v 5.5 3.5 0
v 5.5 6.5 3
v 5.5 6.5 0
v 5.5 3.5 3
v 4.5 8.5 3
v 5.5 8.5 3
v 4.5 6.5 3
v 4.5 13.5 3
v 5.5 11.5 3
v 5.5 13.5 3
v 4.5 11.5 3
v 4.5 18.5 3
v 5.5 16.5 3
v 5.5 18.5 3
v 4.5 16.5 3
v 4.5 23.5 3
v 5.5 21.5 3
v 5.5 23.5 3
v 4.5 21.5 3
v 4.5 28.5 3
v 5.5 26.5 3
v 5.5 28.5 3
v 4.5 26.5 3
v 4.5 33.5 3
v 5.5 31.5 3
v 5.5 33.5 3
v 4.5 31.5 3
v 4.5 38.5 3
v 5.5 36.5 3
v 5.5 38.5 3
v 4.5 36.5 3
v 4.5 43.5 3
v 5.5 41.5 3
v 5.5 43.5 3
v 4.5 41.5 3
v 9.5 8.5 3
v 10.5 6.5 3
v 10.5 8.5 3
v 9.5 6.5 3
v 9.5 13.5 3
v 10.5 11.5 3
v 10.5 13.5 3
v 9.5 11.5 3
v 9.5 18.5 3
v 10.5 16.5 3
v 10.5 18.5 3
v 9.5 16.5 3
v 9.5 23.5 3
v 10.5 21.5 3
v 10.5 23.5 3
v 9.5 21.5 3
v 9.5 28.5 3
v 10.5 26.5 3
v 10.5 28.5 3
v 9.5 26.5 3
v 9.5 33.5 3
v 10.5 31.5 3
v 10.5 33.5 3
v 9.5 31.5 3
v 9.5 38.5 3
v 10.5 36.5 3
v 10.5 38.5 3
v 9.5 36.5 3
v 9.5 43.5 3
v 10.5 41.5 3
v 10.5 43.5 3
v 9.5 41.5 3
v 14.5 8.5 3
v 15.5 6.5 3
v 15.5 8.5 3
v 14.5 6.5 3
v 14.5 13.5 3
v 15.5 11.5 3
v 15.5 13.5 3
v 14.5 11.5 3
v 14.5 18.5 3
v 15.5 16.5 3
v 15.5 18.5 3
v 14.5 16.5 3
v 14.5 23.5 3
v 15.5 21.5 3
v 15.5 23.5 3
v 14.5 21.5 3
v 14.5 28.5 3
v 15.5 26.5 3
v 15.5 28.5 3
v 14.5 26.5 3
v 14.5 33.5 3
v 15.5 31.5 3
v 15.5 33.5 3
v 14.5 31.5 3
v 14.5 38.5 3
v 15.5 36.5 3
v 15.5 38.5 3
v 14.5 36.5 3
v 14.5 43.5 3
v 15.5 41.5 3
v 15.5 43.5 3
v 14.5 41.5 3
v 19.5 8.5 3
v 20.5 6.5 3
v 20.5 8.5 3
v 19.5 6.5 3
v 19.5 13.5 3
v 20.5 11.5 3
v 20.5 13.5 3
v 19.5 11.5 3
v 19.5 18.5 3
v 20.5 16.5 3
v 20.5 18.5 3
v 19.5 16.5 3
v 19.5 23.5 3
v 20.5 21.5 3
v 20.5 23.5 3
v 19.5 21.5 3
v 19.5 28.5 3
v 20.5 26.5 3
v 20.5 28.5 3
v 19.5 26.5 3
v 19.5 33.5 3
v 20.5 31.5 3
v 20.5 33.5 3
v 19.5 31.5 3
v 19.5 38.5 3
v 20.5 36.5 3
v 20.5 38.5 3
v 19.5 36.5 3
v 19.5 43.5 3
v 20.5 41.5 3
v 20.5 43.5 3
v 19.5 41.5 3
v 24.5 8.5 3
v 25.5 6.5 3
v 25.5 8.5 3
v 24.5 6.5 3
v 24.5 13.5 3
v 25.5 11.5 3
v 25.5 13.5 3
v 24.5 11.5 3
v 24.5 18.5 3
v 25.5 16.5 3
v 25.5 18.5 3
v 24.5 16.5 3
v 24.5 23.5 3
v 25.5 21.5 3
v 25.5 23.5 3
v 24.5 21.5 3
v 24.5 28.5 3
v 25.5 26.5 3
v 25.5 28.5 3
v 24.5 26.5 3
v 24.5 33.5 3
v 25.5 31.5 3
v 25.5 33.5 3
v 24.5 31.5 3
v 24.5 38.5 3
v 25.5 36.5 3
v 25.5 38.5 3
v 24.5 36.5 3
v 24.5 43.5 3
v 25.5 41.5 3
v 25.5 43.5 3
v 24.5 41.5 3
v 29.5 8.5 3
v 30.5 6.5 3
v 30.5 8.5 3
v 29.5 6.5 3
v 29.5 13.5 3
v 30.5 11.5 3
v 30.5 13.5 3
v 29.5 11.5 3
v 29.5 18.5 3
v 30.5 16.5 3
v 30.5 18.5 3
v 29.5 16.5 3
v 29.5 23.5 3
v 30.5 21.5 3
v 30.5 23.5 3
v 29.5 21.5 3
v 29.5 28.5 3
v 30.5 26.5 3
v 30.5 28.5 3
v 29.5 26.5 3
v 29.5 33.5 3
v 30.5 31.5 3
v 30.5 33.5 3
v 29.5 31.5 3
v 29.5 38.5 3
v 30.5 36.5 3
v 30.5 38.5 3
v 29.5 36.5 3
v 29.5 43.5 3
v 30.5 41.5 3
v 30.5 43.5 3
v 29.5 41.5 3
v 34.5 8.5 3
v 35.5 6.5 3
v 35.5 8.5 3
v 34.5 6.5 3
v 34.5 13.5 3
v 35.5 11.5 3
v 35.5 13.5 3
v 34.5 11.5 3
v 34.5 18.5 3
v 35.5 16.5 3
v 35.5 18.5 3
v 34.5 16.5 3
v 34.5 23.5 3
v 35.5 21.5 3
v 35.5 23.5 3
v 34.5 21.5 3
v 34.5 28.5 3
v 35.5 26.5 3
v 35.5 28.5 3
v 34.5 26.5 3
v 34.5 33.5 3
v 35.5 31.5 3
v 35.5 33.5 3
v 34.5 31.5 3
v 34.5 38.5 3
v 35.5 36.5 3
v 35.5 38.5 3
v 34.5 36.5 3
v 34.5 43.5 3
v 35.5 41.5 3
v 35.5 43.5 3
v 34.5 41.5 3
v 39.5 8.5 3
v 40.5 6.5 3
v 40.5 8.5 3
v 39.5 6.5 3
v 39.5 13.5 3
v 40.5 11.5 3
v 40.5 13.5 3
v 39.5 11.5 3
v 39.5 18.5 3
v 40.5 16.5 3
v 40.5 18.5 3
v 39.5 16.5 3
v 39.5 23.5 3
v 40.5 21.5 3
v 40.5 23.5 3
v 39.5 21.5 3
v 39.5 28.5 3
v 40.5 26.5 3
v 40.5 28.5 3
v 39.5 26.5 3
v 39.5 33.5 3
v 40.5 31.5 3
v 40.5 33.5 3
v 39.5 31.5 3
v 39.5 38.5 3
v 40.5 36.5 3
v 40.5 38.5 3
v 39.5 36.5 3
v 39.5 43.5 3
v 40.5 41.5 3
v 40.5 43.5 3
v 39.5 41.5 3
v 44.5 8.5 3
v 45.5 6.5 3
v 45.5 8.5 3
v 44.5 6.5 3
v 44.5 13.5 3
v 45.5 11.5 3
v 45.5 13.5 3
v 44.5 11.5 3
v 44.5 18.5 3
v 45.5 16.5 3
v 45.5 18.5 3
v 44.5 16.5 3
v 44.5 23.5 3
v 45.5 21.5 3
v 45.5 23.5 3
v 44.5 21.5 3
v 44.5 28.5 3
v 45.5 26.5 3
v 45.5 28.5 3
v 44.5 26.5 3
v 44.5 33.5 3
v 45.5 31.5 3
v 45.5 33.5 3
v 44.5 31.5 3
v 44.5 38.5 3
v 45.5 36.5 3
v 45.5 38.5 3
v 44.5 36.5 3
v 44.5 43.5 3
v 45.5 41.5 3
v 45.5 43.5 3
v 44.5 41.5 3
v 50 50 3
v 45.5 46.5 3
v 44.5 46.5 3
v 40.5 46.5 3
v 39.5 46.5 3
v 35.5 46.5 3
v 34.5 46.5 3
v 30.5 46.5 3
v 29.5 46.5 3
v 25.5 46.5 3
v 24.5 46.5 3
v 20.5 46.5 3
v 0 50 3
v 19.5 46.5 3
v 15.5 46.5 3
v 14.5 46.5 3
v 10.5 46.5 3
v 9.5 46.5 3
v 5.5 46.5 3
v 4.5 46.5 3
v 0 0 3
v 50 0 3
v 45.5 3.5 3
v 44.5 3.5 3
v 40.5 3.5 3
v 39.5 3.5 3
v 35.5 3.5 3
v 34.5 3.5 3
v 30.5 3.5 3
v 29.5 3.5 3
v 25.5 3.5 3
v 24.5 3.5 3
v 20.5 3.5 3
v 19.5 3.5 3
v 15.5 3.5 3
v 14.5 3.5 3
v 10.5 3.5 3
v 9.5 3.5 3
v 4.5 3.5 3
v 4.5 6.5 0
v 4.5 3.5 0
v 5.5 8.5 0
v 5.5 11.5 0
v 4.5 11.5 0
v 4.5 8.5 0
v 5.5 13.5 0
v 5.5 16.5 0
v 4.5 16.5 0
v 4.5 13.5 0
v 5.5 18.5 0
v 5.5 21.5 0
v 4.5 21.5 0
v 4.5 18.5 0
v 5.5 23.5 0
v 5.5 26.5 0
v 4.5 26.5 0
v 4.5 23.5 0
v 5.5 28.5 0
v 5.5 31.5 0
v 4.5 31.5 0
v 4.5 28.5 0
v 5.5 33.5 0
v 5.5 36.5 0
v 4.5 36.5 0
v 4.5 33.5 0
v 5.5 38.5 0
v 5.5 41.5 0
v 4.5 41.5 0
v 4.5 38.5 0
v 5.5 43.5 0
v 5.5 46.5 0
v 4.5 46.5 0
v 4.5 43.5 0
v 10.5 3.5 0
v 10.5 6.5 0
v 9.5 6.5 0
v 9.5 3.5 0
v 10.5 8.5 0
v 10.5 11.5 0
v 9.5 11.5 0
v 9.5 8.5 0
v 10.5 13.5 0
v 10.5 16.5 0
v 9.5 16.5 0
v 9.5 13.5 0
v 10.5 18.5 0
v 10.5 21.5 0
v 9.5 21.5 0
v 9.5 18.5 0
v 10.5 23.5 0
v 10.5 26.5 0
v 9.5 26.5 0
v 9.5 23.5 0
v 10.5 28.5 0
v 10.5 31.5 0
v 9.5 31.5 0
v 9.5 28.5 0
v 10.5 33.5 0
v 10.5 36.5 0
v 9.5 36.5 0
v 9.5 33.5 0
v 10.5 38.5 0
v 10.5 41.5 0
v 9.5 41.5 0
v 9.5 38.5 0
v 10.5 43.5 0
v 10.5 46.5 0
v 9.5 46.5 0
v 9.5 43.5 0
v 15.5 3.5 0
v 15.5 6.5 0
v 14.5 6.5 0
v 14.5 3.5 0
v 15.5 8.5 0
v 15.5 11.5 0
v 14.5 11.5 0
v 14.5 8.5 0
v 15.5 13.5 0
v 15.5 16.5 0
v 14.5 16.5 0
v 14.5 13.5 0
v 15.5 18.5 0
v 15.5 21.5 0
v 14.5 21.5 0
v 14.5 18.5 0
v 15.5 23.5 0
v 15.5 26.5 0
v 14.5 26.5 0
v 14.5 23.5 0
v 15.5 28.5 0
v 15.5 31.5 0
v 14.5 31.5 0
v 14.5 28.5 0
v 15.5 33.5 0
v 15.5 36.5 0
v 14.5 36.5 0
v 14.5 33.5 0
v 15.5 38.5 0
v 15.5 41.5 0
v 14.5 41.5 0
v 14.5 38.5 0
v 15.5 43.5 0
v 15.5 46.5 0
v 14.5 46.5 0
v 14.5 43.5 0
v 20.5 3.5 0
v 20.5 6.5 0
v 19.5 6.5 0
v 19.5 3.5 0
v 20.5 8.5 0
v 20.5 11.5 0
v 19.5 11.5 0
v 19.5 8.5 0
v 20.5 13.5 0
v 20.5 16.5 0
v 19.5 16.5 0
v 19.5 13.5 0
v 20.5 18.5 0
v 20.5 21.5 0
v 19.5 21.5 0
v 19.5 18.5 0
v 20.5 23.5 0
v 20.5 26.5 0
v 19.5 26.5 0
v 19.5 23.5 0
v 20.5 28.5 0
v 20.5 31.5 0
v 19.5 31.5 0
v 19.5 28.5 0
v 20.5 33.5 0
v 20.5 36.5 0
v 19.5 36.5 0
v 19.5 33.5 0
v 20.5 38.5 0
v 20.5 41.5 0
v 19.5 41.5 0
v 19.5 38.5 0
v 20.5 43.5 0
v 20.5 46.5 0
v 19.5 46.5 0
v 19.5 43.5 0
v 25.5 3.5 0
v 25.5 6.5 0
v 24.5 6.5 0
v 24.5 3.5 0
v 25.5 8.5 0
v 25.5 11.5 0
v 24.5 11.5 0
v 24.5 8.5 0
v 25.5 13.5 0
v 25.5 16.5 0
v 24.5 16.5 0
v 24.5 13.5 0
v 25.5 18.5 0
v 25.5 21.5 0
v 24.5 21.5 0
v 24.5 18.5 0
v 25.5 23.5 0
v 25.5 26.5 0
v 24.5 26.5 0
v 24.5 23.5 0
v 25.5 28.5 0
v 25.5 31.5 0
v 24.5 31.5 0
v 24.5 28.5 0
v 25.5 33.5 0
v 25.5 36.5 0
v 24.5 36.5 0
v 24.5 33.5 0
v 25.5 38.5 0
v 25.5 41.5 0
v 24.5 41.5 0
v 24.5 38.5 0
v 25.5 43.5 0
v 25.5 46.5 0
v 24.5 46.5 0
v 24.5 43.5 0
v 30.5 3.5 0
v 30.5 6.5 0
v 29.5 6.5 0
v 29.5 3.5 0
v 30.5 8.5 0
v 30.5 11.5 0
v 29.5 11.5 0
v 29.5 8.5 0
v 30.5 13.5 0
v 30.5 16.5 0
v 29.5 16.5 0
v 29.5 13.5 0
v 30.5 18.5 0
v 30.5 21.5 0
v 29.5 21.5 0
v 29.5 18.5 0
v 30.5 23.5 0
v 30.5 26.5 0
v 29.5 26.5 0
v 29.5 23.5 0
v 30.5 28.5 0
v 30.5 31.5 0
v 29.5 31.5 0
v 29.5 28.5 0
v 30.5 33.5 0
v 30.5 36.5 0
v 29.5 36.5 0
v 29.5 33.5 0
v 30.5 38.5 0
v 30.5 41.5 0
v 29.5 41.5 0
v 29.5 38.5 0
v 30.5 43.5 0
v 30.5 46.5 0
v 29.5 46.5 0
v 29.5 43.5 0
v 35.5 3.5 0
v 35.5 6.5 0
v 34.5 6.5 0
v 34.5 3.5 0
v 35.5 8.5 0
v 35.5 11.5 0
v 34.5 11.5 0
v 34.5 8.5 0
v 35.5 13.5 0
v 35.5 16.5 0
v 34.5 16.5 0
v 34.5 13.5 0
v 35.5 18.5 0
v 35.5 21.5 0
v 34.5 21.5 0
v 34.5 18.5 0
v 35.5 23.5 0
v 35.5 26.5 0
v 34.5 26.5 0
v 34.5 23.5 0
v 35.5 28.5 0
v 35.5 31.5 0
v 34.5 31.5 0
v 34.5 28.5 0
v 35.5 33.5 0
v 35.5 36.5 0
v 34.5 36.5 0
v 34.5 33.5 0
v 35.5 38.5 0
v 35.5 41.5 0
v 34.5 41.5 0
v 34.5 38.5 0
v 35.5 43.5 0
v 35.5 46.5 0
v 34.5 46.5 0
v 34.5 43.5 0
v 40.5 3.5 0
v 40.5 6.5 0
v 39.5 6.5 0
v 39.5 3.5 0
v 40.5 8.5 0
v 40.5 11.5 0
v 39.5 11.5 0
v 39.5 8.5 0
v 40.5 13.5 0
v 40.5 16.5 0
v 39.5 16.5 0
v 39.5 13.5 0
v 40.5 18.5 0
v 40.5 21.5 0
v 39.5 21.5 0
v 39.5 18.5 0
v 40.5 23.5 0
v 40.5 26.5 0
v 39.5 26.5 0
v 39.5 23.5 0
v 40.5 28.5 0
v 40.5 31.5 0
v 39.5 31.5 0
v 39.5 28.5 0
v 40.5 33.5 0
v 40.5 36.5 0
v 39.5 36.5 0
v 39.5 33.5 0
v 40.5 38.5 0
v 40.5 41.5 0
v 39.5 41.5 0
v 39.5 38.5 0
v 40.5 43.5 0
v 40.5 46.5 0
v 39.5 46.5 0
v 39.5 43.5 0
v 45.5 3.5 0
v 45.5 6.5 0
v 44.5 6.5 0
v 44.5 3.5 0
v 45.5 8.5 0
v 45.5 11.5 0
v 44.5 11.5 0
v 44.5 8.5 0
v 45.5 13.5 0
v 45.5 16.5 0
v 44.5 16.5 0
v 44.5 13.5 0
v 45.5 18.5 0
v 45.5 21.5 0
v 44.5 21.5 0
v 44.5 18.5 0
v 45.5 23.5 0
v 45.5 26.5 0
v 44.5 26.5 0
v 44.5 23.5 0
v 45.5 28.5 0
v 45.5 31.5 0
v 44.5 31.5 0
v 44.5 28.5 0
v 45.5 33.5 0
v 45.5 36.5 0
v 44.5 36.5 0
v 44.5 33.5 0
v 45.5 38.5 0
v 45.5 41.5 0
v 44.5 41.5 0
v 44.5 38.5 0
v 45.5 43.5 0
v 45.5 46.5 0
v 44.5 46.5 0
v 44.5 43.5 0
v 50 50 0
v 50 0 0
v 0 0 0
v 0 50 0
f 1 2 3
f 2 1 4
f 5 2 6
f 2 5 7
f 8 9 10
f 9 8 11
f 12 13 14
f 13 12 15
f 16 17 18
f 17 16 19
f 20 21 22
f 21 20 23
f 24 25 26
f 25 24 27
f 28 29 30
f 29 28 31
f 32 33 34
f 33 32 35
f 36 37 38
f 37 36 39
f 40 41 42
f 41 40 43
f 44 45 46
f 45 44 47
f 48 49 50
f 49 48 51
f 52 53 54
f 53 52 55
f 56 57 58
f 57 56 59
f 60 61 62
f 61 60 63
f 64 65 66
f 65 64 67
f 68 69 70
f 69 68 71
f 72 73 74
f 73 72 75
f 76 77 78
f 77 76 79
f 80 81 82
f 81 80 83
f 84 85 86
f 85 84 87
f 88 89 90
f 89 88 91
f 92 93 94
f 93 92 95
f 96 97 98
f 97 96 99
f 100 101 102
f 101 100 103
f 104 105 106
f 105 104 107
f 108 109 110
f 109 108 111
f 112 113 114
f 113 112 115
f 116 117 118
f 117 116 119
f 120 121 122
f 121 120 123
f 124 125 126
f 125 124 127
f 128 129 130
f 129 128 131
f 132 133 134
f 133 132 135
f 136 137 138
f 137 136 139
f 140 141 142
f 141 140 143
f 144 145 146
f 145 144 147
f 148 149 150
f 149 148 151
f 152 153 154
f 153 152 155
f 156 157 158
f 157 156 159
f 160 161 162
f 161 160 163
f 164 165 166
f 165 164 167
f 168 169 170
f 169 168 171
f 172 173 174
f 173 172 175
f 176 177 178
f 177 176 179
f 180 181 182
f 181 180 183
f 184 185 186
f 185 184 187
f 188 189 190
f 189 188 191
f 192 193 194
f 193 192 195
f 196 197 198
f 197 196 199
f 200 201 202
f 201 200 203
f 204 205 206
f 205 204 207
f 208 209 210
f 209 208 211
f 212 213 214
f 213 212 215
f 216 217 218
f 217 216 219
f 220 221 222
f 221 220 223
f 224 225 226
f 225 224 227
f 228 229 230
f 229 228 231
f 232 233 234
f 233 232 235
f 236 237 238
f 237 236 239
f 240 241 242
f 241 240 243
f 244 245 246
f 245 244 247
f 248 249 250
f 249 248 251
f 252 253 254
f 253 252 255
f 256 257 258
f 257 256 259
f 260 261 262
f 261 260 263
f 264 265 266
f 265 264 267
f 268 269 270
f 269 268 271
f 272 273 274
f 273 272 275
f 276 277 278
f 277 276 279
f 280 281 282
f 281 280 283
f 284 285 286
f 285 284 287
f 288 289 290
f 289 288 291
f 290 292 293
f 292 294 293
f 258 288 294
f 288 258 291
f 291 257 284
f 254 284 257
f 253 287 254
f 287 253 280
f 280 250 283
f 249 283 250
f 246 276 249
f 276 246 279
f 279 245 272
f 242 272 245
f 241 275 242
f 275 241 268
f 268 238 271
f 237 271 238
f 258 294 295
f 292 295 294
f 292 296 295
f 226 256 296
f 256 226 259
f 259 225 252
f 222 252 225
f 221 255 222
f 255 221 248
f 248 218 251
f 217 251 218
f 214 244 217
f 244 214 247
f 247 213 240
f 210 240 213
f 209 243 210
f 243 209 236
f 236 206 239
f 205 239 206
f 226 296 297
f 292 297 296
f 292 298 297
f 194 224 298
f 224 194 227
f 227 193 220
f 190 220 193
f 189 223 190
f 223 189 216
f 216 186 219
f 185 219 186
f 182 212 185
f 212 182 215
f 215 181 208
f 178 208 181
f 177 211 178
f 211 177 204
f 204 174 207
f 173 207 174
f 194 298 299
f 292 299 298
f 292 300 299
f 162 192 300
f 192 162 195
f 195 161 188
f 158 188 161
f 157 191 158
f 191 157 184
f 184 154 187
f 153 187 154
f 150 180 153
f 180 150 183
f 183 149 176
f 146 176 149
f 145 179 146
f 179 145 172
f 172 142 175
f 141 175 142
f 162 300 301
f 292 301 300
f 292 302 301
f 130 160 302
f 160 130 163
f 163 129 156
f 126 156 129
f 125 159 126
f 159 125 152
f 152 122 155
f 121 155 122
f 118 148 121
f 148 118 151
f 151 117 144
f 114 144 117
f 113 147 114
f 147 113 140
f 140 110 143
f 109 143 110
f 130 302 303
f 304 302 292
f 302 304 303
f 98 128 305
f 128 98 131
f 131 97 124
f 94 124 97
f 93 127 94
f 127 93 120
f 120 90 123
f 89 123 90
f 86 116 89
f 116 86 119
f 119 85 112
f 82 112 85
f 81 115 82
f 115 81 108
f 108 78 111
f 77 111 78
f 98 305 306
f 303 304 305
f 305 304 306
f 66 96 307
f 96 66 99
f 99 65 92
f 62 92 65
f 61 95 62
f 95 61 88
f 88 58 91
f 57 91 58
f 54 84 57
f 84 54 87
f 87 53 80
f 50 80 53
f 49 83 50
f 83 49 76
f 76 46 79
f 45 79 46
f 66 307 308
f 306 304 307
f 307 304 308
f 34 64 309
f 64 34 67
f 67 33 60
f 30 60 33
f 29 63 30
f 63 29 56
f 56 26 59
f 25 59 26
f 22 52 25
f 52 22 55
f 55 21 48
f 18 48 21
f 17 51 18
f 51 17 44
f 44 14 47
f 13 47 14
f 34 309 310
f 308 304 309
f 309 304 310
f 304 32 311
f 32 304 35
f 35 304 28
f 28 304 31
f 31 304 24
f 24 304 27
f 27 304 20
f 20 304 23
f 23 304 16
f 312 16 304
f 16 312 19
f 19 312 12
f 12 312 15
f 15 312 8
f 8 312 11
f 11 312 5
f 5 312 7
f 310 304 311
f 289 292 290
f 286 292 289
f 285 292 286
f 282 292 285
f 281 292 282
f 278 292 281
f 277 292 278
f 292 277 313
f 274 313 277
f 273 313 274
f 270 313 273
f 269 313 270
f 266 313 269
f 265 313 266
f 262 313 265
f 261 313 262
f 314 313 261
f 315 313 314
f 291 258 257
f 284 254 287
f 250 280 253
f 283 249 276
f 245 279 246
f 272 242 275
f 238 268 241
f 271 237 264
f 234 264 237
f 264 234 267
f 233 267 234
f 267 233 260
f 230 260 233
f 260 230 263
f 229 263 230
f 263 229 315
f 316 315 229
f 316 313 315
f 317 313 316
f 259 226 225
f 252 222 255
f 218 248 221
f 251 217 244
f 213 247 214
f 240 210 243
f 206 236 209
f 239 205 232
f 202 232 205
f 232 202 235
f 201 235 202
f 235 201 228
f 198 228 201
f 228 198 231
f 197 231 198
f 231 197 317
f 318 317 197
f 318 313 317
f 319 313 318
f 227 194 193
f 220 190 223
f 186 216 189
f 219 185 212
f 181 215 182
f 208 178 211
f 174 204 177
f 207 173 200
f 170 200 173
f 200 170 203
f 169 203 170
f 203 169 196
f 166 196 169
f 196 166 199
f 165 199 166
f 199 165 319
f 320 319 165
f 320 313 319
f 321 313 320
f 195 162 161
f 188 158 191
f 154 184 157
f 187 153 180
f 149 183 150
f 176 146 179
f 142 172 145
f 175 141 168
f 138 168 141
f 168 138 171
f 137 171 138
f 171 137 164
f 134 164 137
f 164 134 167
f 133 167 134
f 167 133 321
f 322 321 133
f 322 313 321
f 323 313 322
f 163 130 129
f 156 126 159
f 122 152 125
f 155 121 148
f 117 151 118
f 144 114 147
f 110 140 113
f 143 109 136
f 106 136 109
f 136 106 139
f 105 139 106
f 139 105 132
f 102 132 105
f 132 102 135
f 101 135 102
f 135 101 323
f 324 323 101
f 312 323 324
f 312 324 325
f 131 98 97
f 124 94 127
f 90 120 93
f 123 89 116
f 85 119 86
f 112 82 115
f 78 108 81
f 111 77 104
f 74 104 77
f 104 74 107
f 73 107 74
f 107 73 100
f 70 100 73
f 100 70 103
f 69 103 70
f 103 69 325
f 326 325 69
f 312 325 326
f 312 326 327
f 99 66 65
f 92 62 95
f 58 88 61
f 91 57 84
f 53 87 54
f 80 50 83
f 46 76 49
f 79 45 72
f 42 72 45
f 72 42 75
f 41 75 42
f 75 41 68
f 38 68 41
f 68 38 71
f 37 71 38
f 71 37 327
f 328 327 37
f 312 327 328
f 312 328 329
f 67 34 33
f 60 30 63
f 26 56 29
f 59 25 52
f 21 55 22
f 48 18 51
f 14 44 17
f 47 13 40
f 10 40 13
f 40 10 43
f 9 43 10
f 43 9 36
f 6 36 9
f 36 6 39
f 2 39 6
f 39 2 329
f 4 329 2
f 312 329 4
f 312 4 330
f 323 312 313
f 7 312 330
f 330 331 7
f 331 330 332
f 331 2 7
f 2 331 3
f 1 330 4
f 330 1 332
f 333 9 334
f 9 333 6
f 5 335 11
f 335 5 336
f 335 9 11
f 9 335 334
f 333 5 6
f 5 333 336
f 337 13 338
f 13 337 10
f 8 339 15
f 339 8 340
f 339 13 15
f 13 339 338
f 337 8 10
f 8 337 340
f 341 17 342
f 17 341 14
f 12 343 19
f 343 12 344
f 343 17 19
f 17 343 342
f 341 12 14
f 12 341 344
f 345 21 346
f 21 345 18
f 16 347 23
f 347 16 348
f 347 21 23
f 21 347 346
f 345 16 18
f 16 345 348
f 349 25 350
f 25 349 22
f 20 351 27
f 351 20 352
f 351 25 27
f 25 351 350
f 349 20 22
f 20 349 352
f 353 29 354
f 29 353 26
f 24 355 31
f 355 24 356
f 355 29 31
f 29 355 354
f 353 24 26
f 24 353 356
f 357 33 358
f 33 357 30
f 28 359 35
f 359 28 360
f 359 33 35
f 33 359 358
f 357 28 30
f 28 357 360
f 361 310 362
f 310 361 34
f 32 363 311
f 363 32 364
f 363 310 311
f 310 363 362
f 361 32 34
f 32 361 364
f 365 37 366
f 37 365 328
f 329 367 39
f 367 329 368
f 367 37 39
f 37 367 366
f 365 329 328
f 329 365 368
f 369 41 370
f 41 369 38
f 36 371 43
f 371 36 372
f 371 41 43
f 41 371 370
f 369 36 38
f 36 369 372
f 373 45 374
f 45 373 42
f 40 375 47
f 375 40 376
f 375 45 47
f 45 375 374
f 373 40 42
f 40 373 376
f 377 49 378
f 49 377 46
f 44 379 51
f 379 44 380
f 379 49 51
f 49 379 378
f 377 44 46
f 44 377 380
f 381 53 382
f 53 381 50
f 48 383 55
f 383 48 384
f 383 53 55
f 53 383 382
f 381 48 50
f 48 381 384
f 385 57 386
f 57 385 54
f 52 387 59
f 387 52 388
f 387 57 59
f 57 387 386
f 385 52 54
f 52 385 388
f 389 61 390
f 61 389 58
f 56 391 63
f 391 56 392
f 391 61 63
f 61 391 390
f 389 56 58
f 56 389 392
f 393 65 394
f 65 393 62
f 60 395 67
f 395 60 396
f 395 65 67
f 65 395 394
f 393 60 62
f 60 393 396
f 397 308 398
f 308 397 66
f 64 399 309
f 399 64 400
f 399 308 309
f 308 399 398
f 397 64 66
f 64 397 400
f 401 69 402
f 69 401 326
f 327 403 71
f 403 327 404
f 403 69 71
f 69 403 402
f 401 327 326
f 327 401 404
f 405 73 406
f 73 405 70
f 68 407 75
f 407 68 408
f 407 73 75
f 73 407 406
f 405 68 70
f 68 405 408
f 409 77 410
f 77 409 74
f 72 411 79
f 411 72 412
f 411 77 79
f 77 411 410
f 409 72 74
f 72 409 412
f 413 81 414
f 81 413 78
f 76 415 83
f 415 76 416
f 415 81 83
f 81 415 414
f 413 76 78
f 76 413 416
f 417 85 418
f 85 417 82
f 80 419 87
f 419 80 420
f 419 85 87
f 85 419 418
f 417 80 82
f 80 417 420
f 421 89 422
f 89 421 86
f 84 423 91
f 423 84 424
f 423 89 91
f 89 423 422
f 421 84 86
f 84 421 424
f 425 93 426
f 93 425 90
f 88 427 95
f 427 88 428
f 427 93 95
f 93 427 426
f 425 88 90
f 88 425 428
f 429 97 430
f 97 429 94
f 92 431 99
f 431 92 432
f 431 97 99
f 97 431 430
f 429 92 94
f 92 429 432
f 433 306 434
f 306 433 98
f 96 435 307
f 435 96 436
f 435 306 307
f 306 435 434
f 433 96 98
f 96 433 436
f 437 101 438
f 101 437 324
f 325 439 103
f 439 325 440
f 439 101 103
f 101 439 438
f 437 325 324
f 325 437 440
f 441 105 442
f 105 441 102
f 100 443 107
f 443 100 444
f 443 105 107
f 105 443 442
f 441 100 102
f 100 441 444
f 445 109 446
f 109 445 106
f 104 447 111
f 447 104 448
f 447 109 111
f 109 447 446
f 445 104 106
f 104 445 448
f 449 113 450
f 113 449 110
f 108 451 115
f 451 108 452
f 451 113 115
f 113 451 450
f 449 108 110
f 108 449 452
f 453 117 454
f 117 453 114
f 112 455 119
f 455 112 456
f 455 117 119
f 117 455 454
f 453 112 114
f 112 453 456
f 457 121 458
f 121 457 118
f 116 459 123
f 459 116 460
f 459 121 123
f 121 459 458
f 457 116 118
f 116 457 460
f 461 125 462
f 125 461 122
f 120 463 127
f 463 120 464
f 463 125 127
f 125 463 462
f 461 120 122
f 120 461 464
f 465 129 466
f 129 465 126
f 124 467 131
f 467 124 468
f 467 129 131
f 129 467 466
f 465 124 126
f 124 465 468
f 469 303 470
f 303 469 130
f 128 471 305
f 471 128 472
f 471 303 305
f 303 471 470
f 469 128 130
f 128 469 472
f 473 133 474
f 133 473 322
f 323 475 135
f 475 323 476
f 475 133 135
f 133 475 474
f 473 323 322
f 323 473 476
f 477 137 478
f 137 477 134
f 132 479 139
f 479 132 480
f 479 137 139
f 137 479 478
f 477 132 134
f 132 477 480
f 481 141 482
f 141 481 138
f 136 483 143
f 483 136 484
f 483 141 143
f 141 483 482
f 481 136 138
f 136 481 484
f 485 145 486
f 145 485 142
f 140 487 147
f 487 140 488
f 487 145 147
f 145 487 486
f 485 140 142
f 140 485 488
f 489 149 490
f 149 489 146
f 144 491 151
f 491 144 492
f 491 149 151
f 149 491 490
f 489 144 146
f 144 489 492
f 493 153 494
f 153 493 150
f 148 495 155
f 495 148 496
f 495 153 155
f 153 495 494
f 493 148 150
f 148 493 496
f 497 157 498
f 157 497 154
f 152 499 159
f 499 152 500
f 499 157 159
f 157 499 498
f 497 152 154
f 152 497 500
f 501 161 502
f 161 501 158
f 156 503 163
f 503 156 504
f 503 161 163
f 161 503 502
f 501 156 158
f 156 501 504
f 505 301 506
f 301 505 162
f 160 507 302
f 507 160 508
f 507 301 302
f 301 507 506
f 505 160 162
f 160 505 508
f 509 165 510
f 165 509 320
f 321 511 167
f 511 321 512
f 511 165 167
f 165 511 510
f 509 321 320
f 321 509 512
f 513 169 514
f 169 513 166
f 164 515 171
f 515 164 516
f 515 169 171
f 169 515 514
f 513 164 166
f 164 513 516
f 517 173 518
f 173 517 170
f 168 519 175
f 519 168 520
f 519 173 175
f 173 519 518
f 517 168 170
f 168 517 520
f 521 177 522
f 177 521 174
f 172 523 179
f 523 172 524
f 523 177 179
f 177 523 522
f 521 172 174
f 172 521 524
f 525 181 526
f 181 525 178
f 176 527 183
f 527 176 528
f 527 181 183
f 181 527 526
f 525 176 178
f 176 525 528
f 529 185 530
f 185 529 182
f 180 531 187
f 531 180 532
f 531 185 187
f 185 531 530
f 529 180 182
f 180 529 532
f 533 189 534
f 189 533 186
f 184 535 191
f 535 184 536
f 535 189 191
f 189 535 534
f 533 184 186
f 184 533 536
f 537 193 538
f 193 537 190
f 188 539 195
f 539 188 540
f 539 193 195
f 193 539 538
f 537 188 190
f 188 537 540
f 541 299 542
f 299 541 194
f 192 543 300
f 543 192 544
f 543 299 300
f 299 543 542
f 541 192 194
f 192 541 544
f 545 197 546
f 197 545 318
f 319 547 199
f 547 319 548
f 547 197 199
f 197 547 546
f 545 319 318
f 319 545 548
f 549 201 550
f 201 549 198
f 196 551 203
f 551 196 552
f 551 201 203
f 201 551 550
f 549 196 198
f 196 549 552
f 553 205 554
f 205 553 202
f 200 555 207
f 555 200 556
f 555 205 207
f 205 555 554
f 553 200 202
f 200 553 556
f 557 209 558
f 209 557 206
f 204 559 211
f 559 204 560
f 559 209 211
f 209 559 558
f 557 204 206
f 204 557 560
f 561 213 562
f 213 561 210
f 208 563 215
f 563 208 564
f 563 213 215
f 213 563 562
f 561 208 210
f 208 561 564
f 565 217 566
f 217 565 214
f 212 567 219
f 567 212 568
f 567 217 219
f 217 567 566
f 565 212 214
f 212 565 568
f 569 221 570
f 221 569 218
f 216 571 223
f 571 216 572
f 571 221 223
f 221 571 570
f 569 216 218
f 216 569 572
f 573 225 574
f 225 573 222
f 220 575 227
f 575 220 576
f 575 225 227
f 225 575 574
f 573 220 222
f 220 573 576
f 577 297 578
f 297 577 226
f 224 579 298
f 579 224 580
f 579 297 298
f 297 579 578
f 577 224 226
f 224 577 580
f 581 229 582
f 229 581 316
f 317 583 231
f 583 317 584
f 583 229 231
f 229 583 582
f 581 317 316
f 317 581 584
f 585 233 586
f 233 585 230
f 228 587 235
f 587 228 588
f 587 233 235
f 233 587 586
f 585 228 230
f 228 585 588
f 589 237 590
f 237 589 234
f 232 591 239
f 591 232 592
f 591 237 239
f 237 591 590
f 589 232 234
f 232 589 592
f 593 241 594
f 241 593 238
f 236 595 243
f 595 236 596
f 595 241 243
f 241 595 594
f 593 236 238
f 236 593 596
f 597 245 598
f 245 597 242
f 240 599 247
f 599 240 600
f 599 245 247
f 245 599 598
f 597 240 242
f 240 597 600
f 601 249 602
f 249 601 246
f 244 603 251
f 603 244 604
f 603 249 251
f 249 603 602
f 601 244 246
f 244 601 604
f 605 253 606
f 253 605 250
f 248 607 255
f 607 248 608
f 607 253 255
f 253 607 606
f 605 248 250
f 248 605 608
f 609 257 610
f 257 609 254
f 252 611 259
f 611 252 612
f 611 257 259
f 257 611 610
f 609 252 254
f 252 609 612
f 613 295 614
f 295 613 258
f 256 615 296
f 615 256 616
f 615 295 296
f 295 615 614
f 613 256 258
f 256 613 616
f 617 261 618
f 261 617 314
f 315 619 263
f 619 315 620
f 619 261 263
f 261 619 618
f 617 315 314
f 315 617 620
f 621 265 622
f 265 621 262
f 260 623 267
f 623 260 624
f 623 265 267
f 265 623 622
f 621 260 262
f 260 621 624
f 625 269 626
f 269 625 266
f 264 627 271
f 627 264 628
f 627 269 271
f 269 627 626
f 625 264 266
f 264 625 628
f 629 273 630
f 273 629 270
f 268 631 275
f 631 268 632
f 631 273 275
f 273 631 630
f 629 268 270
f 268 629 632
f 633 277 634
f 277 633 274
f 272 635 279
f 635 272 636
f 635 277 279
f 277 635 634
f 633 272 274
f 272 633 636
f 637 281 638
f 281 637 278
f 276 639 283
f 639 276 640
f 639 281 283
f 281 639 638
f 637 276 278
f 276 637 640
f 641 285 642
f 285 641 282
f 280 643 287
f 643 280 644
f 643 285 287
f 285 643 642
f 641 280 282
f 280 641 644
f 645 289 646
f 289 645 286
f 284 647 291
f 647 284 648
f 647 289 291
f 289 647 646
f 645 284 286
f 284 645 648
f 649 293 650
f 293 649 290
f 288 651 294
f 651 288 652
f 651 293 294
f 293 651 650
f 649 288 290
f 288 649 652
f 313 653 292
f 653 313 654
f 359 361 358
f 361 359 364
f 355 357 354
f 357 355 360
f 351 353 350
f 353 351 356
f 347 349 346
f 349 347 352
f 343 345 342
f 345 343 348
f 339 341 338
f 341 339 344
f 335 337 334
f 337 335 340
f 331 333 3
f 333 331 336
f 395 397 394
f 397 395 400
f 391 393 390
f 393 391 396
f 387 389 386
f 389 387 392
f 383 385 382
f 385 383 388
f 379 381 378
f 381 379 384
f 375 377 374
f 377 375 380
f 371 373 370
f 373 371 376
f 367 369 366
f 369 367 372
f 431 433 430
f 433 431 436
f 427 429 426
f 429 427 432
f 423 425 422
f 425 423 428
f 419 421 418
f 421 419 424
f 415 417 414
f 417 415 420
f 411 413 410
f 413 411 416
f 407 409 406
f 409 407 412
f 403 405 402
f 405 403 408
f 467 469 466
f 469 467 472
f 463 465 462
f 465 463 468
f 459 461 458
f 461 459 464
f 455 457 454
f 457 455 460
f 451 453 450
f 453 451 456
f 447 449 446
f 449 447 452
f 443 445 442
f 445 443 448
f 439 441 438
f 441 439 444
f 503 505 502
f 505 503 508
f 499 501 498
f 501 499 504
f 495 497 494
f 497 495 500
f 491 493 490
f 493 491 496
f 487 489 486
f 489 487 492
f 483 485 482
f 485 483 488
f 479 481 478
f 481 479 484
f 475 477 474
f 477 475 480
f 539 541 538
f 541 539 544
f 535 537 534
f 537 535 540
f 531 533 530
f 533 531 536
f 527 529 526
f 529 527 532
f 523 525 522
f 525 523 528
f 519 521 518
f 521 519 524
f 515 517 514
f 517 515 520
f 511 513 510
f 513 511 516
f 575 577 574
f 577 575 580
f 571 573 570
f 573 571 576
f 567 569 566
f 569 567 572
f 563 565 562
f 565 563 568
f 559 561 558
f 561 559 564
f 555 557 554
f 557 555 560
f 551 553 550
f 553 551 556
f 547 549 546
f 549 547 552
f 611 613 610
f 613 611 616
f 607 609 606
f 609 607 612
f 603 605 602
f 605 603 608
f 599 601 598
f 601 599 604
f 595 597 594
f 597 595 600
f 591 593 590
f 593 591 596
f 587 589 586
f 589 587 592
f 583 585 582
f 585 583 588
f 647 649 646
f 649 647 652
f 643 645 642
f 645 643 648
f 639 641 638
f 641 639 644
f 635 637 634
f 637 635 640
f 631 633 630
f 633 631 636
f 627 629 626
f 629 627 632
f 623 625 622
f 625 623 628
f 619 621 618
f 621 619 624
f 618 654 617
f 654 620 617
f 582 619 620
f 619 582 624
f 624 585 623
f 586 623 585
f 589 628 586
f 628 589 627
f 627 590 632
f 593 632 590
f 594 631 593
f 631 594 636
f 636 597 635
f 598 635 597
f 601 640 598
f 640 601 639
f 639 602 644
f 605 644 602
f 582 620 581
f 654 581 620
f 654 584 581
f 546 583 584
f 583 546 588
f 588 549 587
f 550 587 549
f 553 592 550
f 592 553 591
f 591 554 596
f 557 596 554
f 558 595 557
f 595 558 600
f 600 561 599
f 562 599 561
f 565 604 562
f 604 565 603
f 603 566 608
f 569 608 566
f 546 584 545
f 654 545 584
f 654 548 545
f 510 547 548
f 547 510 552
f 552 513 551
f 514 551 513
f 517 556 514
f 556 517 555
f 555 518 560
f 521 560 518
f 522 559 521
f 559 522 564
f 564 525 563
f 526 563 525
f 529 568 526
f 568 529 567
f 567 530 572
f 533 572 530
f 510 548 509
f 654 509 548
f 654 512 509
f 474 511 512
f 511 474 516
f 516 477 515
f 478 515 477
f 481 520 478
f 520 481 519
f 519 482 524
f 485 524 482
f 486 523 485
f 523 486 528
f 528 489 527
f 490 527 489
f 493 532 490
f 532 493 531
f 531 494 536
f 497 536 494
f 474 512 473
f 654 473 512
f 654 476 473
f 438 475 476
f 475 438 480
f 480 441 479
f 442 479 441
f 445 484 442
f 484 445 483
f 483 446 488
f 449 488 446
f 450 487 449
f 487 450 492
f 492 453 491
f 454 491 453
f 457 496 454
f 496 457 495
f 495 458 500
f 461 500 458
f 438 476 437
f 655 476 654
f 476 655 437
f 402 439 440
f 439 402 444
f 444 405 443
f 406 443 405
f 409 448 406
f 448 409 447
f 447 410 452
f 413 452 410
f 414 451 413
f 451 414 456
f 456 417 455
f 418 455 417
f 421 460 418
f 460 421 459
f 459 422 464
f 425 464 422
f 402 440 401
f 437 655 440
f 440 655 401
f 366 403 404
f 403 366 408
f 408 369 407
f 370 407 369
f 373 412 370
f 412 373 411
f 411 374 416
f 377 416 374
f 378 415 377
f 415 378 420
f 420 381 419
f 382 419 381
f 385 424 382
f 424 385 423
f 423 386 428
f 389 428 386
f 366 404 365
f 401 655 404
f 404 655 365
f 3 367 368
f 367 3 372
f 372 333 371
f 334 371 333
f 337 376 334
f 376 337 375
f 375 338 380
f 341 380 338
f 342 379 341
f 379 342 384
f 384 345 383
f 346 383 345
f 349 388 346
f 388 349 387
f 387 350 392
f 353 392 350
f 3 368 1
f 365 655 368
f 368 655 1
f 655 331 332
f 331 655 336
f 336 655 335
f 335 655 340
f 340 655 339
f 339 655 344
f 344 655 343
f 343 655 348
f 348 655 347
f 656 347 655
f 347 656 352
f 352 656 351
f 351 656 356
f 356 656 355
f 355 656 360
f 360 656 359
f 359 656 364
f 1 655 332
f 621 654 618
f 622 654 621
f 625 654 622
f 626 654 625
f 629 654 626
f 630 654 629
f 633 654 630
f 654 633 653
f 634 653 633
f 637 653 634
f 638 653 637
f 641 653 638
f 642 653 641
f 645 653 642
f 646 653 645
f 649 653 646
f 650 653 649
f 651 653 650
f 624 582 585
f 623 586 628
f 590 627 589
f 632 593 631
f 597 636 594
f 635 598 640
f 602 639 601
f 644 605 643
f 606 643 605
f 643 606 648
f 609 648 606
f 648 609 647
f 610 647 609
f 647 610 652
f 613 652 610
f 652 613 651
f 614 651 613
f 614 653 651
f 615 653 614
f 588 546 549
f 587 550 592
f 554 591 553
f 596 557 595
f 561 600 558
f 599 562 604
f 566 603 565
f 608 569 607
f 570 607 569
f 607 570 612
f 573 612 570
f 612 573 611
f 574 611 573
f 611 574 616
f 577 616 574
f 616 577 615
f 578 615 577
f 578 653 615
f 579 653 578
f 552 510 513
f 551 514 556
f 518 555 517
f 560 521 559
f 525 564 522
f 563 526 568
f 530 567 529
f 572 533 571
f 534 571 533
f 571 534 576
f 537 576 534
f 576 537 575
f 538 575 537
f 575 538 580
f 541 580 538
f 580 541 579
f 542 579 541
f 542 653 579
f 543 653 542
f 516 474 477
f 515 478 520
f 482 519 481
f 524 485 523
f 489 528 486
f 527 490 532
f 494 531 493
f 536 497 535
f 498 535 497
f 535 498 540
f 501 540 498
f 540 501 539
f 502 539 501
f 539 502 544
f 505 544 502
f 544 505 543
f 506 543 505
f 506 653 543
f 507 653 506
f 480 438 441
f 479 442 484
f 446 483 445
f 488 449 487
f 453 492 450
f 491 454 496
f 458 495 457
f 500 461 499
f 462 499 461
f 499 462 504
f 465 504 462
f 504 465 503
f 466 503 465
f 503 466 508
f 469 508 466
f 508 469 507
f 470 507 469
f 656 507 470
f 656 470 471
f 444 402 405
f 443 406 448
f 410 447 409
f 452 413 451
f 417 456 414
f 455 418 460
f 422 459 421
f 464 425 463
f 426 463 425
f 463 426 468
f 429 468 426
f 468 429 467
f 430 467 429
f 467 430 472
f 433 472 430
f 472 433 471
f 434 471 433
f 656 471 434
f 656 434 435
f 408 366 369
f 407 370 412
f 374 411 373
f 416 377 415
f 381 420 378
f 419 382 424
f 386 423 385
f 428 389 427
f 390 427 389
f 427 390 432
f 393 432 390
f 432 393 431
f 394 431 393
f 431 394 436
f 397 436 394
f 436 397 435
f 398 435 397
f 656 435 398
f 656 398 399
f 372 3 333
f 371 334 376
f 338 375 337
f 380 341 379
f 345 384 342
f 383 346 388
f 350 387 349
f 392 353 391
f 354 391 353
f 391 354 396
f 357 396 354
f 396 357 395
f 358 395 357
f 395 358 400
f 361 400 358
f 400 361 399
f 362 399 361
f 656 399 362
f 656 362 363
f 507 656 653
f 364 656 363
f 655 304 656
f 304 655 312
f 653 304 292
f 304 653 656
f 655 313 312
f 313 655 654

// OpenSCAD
/*	Zip-Plate Custome Plate
	Created by Newton Robinson

	Zip-Plate is a construction set that is connected with 4" zip ties
	
	My plan is to create a set of pieces that can be used as a platform for robots.
*/

//Height of the Zip-Plate in mm: 
Height = 3;				// [1:5]	
//Length should be in a multiple of Spacing: 
Length = 50;			// [10:200:5] 
//Width should be in a multiple of Spacing: 
Width = 50;				// [10:200] 
//Spacing between holes in mm: 
Spacing = 5;			// [5:20]
// Height of the zip tie (Flat part): 
Zip_Tie_Height = 1;	// [1:2] 
// Width of the zip tie: 
Zip_Tie_Width = 3;	// [3:5] 

difference() {
	cube(size = [Length, Width, Height], center = false);
	for (x = [Spacing : Spacing : Length - Spacing] )
	{
		for (y = [Spacing : Spacing : Width - Spacing] )
		{
			translate ([ x , y , 0 ]) cube( size = [Zip_Tie_Height, Zip_Tie_Width, Height * 2], center = true);
		}
	}
}



































